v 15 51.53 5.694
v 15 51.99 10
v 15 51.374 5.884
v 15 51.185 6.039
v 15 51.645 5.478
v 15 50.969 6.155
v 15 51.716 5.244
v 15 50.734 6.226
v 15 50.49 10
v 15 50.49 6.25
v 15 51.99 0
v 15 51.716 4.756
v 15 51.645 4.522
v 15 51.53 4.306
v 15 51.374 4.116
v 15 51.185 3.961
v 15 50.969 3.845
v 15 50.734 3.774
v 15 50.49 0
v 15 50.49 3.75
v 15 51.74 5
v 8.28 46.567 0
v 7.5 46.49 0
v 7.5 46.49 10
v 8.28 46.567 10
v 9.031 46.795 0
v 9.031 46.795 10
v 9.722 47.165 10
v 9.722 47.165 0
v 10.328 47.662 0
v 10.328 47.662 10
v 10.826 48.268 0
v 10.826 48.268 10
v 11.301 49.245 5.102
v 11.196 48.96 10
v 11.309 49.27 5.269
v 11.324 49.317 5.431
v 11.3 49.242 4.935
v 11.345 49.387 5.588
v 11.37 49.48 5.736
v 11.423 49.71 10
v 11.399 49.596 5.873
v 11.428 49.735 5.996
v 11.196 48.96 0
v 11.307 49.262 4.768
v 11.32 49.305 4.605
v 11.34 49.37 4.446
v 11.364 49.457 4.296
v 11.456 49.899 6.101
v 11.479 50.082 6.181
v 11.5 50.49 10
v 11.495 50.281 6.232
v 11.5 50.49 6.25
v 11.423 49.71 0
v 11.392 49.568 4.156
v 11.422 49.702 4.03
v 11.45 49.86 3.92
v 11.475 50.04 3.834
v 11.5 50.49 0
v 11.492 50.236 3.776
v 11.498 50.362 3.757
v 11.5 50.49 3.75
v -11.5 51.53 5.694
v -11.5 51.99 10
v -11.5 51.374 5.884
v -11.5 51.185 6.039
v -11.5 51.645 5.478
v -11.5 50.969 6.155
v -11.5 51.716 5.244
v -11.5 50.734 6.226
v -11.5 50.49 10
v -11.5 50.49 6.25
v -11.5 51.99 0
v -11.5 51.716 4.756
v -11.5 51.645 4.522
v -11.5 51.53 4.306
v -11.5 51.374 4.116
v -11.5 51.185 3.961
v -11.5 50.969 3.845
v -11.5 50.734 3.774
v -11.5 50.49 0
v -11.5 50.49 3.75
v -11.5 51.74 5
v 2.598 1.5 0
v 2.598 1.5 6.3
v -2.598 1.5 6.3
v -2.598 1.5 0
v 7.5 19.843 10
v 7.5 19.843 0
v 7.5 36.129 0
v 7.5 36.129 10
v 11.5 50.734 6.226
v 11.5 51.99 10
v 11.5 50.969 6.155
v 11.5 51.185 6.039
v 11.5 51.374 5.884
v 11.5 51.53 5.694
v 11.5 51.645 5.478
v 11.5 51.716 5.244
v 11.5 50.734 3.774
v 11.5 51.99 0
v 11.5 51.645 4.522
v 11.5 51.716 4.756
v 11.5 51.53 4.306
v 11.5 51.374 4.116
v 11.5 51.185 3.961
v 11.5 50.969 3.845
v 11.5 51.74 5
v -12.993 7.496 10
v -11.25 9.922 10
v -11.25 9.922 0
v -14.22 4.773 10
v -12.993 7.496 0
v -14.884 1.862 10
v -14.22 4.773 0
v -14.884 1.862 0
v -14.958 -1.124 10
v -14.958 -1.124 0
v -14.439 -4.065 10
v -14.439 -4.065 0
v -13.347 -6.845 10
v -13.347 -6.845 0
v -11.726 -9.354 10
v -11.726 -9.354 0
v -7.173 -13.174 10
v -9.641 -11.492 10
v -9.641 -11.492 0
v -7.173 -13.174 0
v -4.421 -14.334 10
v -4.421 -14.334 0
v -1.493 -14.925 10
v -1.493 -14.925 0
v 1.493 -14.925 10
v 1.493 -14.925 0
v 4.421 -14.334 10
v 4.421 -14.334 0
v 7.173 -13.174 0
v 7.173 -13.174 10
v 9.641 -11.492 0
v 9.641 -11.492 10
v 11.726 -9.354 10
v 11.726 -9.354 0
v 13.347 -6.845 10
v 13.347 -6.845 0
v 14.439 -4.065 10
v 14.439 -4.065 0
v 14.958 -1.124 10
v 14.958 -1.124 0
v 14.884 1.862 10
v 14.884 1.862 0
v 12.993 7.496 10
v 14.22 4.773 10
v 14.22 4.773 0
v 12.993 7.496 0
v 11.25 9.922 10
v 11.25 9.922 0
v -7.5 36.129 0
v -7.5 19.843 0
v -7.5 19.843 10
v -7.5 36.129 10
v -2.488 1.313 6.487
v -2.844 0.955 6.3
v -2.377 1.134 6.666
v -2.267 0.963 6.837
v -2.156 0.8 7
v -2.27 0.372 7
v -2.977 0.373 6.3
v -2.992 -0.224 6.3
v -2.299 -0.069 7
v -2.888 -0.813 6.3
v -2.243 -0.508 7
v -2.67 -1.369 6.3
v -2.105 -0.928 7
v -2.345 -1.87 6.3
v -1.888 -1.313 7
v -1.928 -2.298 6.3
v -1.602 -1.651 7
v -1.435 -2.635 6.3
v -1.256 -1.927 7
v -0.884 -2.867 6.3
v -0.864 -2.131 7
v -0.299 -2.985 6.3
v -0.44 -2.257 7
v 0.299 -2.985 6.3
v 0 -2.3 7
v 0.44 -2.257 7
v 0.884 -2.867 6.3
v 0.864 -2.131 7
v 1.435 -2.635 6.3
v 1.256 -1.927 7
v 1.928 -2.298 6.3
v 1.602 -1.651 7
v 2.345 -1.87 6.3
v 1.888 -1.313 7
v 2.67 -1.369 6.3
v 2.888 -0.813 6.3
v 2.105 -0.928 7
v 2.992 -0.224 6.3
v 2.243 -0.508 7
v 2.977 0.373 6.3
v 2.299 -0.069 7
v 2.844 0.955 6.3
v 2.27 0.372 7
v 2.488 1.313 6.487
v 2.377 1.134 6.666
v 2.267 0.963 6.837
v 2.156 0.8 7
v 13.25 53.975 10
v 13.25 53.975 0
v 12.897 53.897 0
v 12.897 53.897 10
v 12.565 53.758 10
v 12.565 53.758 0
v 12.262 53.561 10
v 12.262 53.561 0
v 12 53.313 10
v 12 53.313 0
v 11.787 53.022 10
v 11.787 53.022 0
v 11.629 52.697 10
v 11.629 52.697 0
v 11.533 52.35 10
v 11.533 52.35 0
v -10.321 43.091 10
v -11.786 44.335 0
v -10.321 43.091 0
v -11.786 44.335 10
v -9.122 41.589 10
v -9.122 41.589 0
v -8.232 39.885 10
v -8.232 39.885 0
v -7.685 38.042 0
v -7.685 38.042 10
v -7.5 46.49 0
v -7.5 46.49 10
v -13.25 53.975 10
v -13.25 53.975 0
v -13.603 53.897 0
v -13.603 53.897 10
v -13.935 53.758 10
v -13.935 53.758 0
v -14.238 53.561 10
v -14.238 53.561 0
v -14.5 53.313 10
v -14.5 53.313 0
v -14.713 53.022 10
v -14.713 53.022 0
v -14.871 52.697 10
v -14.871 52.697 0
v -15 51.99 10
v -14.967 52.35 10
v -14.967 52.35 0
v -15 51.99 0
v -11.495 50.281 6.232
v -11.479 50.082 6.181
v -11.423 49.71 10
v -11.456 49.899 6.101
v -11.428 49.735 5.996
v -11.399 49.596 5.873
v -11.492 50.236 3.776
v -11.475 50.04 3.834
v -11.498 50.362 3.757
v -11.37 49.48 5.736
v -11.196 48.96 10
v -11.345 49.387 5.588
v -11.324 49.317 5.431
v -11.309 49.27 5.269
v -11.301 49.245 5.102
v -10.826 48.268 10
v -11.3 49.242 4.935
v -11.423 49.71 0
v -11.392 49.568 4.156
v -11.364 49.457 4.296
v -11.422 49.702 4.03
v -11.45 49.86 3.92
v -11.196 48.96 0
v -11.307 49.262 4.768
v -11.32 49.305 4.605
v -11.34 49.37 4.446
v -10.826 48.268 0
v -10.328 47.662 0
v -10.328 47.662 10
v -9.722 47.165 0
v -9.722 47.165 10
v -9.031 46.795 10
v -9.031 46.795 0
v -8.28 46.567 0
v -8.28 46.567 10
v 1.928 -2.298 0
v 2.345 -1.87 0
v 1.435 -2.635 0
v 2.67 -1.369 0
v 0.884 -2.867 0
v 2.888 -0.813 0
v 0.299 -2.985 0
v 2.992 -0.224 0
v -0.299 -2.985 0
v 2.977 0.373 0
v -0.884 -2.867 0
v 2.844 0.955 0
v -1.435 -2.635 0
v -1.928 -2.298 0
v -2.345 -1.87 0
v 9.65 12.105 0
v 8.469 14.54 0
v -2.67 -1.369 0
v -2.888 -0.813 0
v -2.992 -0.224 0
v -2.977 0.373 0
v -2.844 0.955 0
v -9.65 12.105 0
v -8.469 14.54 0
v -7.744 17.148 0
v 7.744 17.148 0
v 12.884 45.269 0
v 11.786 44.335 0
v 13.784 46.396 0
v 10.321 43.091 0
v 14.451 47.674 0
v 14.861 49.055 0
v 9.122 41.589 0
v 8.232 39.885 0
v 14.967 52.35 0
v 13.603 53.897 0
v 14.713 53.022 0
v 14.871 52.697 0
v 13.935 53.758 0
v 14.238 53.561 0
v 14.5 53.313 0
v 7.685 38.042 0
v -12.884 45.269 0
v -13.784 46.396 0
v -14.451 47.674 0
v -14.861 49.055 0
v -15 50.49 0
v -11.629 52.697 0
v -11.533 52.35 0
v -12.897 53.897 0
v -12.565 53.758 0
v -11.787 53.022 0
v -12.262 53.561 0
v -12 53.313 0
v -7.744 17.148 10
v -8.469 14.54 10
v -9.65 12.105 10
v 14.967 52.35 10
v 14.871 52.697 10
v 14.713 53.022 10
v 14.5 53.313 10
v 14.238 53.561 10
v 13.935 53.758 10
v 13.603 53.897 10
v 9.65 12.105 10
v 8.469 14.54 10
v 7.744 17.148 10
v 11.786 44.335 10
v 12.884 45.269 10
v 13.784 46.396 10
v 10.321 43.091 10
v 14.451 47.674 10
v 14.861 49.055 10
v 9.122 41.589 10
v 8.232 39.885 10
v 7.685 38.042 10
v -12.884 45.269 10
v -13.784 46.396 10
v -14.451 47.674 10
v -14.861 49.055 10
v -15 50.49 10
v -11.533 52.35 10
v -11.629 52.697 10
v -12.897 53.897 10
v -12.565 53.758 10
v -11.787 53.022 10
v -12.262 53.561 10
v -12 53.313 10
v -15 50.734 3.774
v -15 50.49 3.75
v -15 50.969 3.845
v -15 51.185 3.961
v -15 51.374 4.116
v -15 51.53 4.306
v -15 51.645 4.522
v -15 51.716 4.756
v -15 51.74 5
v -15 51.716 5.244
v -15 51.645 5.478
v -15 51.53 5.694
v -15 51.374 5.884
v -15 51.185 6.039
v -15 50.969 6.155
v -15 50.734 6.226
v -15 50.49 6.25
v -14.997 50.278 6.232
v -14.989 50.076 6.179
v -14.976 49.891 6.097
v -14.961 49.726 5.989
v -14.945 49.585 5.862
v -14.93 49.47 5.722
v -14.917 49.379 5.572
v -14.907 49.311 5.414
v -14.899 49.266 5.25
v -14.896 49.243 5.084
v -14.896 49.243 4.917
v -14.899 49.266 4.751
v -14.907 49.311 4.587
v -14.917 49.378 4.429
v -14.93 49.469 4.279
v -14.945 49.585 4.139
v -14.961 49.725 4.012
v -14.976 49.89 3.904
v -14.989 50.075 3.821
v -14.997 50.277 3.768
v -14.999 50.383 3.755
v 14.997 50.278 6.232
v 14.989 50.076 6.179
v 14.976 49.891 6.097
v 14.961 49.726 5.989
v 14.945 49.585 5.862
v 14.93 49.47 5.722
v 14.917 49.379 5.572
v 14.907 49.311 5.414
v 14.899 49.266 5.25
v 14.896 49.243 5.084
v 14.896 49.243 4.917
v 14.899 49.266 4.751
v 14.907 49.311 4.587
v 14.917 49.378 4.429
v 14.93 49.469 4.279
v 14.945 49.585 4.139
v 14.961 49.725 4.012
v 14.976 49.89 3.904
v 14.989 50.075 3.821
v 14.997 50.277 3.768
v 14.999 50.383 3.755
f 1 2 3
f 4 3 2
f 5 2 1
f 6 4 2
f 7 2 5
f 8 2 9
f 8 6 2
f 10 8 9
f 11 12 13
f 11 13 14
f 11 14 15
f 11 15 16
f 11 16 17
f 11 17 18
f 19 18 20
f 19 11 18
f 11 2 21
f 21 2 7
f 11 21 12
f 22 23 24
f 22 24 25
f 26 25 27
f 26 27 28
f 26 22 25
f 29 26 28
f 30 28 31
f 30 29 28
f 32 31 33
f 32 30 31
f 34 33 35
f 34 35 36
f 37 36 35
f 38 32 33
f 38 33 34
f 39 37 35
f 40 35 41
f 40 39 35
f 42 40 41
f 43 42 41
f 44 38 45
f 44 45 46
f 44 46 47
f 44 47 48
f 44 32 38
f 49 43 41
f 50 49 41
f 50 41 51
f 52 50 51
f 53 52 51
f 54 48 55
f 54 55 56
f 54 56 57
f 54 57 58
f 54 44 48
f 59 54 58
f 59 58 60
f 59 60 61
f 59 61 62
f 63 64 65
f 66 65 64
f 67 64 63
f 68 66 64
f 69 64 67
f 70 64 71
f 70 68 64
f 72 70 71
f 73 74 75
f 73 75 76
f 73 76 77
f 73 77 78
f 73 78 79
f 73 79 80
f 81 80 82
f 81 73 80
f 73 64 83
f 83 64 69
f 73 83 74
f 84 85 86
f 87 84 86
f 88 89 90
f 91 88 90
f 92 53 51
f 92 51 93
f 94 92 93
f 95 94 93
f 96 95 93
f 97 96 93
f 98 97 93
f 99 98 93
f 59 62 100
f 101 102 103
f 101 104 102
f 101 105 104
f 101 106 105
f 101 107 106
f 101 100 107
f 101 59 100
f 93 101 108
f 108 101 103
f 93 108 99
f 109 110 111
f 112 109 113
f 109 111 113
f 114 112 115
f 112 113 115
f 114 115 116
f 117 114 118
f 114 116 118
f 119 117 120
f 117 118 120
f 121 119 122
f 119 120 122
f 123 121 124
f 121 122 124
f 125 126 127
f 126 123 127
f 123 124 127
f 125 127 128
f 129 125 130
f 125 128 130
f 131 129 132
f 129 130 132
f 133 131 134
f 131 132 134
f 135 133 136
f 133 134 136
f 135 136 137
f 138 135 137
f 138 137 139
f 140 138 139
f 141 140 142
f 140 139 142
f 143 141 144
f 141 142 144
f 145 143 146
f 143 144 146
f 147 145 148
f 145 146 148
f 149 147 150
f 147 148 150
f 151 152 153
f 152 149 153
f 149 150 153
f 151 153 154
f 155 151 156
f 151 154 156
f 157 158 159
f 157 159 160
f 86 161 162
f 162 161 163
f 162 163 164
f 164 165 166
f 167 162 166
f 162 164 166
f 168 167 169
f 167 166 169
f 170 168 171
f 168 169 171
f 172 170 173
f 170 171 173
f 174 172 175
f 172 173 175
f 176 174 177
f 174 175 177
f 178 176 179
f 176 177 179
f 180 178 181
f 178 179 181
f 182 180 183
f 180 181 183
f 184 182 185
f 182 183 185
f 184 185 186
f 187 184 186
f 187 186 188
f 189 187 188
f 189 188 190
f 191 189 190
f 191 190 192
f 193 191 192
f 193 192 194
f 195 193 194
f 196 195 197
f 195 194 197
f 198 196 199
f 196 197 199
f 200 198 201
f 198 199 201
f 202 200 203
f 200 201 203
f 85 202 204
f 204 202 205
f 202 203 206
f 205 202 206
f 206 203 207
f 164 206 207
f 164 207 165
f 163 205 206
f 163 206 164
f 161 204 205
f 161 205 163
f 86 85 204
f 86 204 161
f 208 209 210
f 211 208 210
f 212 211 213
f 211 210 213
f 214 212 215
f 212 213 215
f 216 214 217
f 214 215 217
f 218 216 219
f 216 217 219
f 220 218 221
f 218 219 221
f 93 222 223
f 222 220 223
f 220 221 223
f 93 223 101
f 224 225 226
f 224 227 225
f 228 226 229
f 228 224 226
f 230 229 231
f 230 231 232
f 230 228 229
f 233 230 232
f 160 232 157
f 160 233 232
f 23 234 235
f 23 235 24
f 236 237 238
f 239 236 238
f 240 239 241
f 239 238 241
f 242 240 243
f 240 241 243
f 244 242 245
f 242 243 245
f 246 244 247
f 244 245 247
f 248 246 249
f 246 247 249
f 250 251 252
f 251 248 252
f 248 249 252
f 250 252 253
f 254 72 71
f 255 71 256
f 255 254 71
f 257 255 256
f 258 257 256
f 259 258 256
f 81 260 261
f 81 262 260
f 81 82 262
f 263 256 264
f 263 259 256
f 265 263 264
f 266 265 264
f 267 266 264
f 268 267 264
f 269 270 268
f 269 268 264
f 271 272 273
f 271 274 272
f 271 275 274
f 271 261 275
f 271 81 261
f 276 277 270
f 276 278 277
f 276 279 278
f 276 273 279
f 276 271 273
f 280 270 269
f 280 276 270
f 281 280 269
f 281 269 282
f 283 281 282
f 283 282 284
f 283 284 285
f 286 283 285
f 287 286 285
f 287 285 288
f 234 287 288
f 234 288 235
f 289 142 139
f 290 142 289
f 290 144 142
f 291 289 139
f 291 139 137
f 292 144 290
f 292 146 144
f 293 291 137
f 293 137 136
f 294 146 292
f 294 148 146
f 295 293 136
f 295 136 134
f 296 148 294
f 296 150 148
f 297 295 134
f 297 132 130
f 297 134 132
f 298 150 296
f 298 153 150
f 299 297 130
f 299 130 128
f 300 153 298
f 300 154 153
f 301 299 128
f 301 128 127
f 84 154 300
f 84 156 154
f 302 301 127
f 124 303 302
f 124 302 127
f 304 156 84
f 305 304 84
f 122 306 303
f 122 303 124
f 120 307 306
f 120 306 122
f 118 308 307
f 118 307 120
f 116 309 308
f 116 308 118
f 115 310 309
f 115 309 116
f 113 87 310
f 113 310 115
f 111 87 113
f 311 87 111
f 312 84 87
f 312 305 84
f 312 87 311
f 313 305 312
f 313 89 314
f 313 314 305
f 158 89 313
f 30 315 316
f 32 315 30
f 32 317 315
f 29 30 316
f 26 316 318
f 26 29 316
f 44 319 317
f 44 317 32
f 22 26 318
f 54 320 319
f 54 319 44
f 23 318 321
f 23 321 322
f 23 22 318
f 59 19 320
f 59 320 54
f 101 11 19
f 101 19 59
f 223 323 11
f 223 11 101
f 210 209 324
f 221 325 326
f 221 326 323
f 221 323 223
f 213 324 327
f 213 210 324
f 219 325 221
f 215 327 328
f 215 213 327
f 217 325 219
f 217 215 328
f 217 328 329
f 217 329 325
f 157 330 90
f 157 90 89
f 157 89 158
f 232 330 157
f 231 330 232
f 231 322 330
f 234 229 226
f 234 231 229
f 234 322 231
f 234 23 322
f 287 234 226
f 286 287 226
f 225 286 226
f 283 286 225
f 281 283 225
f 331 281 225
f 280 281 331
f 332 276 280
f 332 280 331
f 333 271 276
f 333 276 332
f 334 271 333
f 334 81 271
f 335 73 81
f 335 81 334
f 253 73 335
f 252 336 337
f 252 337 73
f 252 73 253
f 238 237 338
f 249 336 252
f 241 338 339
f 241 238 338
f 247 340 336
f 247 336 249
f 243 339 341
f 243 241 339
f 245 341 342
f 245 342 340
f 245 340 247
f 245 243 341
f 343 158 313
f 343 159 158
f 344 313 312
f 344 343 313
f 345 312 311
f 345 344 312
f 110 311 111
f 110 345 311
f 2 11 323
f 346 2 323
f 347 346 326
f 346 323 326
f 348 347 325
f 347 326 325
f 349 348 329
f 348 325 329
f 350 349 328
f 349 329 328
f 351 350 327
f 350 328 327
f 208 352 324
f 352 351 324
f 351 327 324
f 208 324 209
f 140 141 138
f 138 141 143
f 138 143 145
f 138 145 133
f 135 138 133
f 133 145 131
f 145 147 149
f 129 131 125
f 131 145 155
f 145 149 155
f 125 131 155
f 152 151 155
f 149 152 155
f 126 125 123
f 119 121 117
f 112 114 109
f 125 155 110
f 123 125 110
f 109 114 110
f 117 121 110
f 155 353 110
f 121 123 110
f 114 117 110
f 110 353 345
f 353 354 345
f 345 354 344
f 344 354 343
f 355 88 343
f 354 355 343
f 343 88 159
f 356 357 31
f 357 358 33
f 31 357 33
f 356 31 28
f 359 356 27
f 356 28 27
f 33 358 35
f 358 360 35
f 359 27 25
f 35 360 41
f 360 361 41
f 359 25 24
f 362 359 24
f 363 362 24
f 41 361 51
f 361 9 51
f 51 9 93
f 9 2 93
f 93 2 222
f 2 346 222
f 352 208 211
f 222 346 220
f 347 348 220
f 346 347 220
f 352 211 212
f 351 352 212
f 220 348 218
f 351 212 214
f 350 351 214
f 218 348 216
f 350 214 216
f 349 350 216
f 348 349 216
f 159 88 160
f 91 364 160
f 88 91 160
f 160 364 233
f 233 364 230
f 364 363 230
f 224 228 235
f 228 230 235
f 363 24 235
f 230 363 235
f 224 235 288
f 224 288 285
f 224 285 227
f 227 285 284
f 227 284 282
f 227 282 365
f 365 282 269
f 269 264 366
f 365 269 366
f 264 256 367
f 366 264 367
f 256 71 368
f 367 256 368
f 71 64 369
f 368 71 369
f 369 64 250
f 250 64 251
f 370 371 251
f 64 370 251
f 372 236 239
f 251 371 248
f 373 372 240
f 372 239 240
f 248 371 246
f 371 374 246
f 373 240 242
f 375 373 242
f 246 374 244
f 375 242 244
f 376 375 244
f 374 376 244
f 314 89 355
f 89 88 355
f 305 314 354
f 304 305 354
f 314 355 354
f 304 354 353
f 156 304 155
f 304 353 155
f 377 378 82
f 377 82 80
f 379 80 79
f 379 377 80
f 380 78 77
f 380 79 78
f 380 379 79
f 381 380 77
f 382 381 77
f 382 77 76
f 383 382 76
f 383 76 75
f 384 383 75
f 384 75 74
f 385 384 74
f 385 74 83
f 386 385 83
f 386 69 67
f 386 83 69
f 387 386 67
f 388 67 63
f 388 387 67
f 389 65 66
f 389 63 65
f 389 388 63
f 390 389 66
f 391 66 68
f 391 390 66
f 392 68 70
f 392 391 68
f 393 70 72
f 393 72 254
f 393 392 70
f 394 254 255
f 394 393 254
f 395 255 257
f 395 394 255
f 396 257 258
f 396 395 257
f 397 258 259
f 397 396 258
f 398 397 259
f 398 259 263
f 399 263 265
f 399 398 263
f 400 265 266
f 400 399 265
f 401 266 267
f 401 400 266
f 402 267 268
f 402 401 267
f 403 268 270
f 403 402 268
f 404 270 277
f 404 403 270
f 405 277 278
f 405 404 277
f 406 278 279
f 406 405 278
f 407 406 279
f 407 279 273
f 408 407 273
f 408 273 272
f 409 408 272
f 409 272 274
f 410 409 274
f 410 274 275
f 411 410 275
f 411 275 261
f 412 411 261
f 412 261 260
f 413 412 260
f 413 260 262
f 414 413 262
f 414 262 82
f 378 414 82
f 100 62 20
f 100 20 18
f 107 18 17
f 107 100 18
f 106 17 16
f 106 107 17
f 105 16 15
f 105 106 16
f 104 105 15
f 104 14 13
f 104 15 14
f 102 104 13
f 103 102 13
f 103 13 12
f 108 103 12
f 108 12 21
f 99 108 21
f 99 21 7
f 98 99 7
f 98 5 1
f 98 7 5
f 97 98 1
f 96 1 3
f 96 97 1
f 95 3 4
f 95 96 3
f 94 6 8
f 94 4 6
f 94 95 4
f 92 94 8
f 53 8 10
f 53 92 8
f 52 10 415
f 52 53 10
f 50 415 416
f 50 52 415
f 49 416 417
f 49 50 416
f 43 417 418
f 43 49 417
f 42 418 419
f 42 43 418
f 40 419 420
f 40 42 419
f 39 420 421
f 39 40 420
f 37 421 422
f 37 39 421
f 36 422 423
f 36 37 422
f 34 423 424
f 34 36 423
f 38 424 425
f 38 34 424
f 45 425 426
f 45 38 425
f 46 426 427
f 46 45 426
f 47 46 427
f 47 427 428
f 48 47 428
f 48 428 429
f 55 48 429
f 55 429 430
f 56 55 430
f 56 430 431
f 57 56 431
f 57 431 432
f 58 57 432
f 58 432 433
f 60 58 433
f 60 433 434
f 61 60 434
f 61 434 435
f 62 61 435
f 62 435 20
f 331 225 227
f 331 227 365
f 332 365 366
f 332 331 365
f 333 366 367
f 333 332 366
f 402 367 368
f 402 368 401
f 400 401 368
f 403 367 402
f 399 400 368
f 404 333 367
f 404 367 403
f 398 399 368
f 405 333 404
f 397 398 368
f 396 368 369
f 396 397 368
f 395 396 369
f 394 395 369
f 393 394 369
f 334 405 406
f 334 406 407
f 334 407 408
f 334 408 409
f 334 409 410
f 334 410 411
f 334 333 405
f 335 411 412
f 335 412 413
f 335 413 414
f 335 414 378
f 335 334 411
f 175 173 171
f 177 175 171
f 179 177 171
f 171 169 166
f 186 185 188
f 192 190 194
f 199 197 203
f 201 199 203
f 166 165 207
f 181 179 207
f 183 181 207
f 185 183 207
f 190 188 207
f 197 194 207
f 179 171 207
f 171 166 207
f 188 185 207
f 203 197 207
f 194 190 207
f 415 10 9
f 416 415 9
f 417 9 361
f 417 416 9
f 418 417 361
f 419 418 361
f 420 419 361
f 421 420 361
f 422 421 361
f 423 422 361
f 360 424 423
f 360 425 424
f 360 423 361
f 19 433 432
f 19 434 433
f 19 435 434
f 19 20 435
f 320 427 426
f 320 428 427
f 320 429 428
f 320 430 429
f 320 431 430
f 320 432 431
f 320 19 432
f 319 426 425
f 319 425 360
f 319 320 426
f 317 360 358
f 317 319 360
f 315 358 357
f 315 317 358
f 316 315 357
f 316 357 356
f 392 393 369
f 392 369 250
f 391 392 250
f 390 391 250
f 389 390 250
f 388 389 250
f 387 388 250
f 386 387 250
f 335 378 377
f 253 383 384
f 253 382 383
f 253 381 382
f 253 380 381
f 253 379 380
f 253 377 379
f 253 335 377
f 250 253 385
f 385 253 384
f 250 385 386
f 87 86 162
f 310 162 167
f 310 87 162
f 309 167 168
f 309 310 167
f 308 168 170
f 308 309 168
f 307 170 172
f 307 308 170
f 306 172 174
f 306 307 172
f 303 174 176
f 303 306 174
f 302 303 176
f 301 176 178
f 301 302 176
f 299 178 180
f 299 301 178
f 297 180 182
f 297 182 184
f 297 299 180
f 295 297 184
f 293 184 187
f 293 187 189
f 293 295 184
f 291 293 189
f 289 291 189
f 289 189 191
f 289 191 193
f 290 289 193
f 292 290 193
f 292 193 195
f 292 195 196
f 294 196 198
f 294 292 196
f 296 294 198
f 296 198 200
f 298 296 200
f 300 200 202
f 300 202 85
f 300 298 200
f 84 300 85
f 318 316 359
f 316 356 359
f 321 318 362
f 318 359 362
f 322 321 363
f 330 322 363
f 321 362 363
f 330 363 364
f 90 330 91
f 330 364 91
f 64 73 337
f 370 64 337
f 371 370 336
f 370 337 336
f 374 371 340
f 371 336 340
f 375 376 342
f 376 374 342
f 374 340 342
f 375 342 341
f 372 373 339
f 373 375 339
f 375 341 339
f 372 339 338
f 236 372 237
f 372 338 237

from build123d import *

# Parameters (mm, degrees)
SKETCH1_R               = 15
SKETCH1_R_2             = 3
BOSS_EXTRUDE1_DEPTH     = 10
SKETCH2_W               = 15
SKETCH2_H               = 30
BOSS_EXTRUDE2_DEPTH     = 10
FILLET1_R               = 15
SKETCH5_W               = 10
SKETCH5_H               = 2
BOSS_EXTRUDE3_DEPTH     = 10
BOSS_EXTRUDE4_START     = -3
SKETCH7_R               = 3
BOSS_EXTRUDE4_DEPTH     = 3
CHAMFER1_SIZE           = 0.7
BOSS_EXTRUDE6_DEPTH     = 10
FILLET4_R               = 2
FILLET2_R               = 10
CUT_EXTRUDE1_DEPTH      = 63.556116013
CUT_EXTRUDE1_DEPTH_BACK = 63.556116013
SKETCH10_R              = 1.25


with BuildPart() as part:
    # Sketch1 → Boss-Extrude1 (new body)
    with BuildSketch(Plane.XY):
        Circle(SKETCH1_R)
        Circle(SKETCH1_R_2, mode=Mode.SUBTRACT)
    extrude(amount=BOSS_EXTRUDE1_DEPTH)

    # Sketch2 → Boss-Extrude2 (add)
    with BuildSketch(Plane.XY):
        with Locations((0, 27.990381057)):
            Rectangle(SKETCH2_W, SKETCH2_H)
    extrude(amount=BOSS_EXTRUDE2_DEPTH)

    # Fillet1
    fillet1_edges = [part.edges().sort_by_distance(p)[0] for p in [
        (-7.5, 12.990381057, 5),
        (7.5, 12.990381057, 5),
    ]]
    fillet(fillet1_edges, radius=FILLET1_R)

    # Sketch5 → Boss-Extrude3 (add)
    with BuildSketch(Plane(origin=(0, 0, 0), x_dir=(-1, 0, 0), z_dir=(0, 0, -1))):
        with Locations((0, 2.5)):
            Rectangle(SKETCH5_W, SKETCH5_H)
    extrude(amount=-BOSS_EXTRUDE3_DEPTH)

    # Sketch7 → Boss-Extrude4 (add)
    with BuildSketch(Plane.XY.offset(10).offset(BOSS_EXTRUDE4_START)):
        Circle(SKETCH7_R)
    extrude(amount=BOSS_EXTRUDE4_DEPTH)

    # Chamfer1
    chamfer1_edges = [part.edges().sort_by_distance(p)[0] for p in [
        (0, 1.5, 7),
        (0, -3, 7),
    ]]
    chamfer(chamfer1_edges, length=CHAMFER1_SIZE)

    # Sketch9 → Boss-Extrude6 (add)
    with BuildSketch(Plane(origin=(0, 0, 0), x_dir=(-1, 0, 0), z_dir=(0, 0, -1))):
        with BuildLine():
            Line((-15, 53.990381057), (-15, 50.490381057))
            ThreePointArc((-15, 50.490381057), (-12.803300859, 45.187080198), (-7.5, 42.990381057))
            Line((-7.5, 42.990381057), (0, 42.990381057))
            Line((0, 42.990381057), (0, 46.490381057))
            Line((0, 46.490381057), (-7.5, 46.490381057))
            ThreePointArc((-7.5, 46.490381057), (-10.328427125, 47.661953932), (-11.5, 50.490381057))
            Line((-11.5, 50.490381057), (-11.5, 53.990381057))
            Line((-11.5, 53.990381057), (-15, 53.990381057))
        make_face()
        with BuildLine():
            Line((0, 46.490381057), (0, 42.990381057))
            Line((0, 42.990381057), (7.5, 42.990381057))
            ThreePointArc((7.5, 42.990381057), (12.803300859, 45.187080198), (15, 50.490381057))
            Line((15, 50.490381057), (15, 53.990381057))
            Line((15, 53.990381057), (11.5, 53.990381057))
            Line((11.5, 53.990381057), (11.5, 50.490381057))
            ThreePointArc((11.5, 50.490381057), (10.328427125, 47.661953932), (7.5, 46.490381057))
            Line((7.5, 46.490381057), (0, 46.490381057))
        make_face()
    extrude(amount=-BOSS_EXTRUDE6_DEPTH)

    # Fillet4
    # the kernel refuses this fillet: 2 mm, written as the material it takes off along each edge
    with BuildSketch(Plane(origin=(11.5, 53.990381057, -5), x_dir=(0, -1, 0), z_dir=(0, 0, 1)), Plane(origin=(15, 53.990381057, -5), x_dir=(-1, 0, 0), z_dir=(0, 0, 1)), Plane(origin=(-11.5, 53.990381057, -5), x_dir=(-1, 0, 0), z_dir=(0, 0, 1)), Plane(origin=(-15, 53.990381057, -5), x_dir=(0, -1, 0), z_dir=(0, 0, 1))) as fillet4_piece_1:
        with BuildLine():
            CenterArc((FILLET4_R, FILLET4_R), FILLET4_R, 180, 90)
            Line((0, FILLET4_R), (0, 0))
            Line((0, 0), (FILLET4_R, 0))
        make_face()
    extrude(amount=20, mode=Mode.SUBTRACT)

    # Fillet2
    fillet2_edges = [part.edges().sort_by_distance(p)[0] for p in [
        (-7.5, 42.990381057, 5),
        (7.5, 42.990381057, 5),
    ]]
    fillet(fillet2_edges, radius=FILLET2_R)

    # Sketch10 → Cut-Extrude1 (cut, two sides: drawn at the far end of the back side and taken through both)
    with BuildSketch(Plane(origin=(15, 0, 0), x_dir=(0, 0, -1), z_dir=(1, 0, 0)).offset(-CUT_EXTRUDE1_DEPTH_BACK)):
        with Locations((-5, 50.490381057)):
            Circle(SKETCH10_R)
    extrude(amount=CUT_EXTRUDE1_DEPTH + CUT_EXTRUDE1_DEPTH_BACK, mode=Mode.SUBTRACT)


solid = part.part
